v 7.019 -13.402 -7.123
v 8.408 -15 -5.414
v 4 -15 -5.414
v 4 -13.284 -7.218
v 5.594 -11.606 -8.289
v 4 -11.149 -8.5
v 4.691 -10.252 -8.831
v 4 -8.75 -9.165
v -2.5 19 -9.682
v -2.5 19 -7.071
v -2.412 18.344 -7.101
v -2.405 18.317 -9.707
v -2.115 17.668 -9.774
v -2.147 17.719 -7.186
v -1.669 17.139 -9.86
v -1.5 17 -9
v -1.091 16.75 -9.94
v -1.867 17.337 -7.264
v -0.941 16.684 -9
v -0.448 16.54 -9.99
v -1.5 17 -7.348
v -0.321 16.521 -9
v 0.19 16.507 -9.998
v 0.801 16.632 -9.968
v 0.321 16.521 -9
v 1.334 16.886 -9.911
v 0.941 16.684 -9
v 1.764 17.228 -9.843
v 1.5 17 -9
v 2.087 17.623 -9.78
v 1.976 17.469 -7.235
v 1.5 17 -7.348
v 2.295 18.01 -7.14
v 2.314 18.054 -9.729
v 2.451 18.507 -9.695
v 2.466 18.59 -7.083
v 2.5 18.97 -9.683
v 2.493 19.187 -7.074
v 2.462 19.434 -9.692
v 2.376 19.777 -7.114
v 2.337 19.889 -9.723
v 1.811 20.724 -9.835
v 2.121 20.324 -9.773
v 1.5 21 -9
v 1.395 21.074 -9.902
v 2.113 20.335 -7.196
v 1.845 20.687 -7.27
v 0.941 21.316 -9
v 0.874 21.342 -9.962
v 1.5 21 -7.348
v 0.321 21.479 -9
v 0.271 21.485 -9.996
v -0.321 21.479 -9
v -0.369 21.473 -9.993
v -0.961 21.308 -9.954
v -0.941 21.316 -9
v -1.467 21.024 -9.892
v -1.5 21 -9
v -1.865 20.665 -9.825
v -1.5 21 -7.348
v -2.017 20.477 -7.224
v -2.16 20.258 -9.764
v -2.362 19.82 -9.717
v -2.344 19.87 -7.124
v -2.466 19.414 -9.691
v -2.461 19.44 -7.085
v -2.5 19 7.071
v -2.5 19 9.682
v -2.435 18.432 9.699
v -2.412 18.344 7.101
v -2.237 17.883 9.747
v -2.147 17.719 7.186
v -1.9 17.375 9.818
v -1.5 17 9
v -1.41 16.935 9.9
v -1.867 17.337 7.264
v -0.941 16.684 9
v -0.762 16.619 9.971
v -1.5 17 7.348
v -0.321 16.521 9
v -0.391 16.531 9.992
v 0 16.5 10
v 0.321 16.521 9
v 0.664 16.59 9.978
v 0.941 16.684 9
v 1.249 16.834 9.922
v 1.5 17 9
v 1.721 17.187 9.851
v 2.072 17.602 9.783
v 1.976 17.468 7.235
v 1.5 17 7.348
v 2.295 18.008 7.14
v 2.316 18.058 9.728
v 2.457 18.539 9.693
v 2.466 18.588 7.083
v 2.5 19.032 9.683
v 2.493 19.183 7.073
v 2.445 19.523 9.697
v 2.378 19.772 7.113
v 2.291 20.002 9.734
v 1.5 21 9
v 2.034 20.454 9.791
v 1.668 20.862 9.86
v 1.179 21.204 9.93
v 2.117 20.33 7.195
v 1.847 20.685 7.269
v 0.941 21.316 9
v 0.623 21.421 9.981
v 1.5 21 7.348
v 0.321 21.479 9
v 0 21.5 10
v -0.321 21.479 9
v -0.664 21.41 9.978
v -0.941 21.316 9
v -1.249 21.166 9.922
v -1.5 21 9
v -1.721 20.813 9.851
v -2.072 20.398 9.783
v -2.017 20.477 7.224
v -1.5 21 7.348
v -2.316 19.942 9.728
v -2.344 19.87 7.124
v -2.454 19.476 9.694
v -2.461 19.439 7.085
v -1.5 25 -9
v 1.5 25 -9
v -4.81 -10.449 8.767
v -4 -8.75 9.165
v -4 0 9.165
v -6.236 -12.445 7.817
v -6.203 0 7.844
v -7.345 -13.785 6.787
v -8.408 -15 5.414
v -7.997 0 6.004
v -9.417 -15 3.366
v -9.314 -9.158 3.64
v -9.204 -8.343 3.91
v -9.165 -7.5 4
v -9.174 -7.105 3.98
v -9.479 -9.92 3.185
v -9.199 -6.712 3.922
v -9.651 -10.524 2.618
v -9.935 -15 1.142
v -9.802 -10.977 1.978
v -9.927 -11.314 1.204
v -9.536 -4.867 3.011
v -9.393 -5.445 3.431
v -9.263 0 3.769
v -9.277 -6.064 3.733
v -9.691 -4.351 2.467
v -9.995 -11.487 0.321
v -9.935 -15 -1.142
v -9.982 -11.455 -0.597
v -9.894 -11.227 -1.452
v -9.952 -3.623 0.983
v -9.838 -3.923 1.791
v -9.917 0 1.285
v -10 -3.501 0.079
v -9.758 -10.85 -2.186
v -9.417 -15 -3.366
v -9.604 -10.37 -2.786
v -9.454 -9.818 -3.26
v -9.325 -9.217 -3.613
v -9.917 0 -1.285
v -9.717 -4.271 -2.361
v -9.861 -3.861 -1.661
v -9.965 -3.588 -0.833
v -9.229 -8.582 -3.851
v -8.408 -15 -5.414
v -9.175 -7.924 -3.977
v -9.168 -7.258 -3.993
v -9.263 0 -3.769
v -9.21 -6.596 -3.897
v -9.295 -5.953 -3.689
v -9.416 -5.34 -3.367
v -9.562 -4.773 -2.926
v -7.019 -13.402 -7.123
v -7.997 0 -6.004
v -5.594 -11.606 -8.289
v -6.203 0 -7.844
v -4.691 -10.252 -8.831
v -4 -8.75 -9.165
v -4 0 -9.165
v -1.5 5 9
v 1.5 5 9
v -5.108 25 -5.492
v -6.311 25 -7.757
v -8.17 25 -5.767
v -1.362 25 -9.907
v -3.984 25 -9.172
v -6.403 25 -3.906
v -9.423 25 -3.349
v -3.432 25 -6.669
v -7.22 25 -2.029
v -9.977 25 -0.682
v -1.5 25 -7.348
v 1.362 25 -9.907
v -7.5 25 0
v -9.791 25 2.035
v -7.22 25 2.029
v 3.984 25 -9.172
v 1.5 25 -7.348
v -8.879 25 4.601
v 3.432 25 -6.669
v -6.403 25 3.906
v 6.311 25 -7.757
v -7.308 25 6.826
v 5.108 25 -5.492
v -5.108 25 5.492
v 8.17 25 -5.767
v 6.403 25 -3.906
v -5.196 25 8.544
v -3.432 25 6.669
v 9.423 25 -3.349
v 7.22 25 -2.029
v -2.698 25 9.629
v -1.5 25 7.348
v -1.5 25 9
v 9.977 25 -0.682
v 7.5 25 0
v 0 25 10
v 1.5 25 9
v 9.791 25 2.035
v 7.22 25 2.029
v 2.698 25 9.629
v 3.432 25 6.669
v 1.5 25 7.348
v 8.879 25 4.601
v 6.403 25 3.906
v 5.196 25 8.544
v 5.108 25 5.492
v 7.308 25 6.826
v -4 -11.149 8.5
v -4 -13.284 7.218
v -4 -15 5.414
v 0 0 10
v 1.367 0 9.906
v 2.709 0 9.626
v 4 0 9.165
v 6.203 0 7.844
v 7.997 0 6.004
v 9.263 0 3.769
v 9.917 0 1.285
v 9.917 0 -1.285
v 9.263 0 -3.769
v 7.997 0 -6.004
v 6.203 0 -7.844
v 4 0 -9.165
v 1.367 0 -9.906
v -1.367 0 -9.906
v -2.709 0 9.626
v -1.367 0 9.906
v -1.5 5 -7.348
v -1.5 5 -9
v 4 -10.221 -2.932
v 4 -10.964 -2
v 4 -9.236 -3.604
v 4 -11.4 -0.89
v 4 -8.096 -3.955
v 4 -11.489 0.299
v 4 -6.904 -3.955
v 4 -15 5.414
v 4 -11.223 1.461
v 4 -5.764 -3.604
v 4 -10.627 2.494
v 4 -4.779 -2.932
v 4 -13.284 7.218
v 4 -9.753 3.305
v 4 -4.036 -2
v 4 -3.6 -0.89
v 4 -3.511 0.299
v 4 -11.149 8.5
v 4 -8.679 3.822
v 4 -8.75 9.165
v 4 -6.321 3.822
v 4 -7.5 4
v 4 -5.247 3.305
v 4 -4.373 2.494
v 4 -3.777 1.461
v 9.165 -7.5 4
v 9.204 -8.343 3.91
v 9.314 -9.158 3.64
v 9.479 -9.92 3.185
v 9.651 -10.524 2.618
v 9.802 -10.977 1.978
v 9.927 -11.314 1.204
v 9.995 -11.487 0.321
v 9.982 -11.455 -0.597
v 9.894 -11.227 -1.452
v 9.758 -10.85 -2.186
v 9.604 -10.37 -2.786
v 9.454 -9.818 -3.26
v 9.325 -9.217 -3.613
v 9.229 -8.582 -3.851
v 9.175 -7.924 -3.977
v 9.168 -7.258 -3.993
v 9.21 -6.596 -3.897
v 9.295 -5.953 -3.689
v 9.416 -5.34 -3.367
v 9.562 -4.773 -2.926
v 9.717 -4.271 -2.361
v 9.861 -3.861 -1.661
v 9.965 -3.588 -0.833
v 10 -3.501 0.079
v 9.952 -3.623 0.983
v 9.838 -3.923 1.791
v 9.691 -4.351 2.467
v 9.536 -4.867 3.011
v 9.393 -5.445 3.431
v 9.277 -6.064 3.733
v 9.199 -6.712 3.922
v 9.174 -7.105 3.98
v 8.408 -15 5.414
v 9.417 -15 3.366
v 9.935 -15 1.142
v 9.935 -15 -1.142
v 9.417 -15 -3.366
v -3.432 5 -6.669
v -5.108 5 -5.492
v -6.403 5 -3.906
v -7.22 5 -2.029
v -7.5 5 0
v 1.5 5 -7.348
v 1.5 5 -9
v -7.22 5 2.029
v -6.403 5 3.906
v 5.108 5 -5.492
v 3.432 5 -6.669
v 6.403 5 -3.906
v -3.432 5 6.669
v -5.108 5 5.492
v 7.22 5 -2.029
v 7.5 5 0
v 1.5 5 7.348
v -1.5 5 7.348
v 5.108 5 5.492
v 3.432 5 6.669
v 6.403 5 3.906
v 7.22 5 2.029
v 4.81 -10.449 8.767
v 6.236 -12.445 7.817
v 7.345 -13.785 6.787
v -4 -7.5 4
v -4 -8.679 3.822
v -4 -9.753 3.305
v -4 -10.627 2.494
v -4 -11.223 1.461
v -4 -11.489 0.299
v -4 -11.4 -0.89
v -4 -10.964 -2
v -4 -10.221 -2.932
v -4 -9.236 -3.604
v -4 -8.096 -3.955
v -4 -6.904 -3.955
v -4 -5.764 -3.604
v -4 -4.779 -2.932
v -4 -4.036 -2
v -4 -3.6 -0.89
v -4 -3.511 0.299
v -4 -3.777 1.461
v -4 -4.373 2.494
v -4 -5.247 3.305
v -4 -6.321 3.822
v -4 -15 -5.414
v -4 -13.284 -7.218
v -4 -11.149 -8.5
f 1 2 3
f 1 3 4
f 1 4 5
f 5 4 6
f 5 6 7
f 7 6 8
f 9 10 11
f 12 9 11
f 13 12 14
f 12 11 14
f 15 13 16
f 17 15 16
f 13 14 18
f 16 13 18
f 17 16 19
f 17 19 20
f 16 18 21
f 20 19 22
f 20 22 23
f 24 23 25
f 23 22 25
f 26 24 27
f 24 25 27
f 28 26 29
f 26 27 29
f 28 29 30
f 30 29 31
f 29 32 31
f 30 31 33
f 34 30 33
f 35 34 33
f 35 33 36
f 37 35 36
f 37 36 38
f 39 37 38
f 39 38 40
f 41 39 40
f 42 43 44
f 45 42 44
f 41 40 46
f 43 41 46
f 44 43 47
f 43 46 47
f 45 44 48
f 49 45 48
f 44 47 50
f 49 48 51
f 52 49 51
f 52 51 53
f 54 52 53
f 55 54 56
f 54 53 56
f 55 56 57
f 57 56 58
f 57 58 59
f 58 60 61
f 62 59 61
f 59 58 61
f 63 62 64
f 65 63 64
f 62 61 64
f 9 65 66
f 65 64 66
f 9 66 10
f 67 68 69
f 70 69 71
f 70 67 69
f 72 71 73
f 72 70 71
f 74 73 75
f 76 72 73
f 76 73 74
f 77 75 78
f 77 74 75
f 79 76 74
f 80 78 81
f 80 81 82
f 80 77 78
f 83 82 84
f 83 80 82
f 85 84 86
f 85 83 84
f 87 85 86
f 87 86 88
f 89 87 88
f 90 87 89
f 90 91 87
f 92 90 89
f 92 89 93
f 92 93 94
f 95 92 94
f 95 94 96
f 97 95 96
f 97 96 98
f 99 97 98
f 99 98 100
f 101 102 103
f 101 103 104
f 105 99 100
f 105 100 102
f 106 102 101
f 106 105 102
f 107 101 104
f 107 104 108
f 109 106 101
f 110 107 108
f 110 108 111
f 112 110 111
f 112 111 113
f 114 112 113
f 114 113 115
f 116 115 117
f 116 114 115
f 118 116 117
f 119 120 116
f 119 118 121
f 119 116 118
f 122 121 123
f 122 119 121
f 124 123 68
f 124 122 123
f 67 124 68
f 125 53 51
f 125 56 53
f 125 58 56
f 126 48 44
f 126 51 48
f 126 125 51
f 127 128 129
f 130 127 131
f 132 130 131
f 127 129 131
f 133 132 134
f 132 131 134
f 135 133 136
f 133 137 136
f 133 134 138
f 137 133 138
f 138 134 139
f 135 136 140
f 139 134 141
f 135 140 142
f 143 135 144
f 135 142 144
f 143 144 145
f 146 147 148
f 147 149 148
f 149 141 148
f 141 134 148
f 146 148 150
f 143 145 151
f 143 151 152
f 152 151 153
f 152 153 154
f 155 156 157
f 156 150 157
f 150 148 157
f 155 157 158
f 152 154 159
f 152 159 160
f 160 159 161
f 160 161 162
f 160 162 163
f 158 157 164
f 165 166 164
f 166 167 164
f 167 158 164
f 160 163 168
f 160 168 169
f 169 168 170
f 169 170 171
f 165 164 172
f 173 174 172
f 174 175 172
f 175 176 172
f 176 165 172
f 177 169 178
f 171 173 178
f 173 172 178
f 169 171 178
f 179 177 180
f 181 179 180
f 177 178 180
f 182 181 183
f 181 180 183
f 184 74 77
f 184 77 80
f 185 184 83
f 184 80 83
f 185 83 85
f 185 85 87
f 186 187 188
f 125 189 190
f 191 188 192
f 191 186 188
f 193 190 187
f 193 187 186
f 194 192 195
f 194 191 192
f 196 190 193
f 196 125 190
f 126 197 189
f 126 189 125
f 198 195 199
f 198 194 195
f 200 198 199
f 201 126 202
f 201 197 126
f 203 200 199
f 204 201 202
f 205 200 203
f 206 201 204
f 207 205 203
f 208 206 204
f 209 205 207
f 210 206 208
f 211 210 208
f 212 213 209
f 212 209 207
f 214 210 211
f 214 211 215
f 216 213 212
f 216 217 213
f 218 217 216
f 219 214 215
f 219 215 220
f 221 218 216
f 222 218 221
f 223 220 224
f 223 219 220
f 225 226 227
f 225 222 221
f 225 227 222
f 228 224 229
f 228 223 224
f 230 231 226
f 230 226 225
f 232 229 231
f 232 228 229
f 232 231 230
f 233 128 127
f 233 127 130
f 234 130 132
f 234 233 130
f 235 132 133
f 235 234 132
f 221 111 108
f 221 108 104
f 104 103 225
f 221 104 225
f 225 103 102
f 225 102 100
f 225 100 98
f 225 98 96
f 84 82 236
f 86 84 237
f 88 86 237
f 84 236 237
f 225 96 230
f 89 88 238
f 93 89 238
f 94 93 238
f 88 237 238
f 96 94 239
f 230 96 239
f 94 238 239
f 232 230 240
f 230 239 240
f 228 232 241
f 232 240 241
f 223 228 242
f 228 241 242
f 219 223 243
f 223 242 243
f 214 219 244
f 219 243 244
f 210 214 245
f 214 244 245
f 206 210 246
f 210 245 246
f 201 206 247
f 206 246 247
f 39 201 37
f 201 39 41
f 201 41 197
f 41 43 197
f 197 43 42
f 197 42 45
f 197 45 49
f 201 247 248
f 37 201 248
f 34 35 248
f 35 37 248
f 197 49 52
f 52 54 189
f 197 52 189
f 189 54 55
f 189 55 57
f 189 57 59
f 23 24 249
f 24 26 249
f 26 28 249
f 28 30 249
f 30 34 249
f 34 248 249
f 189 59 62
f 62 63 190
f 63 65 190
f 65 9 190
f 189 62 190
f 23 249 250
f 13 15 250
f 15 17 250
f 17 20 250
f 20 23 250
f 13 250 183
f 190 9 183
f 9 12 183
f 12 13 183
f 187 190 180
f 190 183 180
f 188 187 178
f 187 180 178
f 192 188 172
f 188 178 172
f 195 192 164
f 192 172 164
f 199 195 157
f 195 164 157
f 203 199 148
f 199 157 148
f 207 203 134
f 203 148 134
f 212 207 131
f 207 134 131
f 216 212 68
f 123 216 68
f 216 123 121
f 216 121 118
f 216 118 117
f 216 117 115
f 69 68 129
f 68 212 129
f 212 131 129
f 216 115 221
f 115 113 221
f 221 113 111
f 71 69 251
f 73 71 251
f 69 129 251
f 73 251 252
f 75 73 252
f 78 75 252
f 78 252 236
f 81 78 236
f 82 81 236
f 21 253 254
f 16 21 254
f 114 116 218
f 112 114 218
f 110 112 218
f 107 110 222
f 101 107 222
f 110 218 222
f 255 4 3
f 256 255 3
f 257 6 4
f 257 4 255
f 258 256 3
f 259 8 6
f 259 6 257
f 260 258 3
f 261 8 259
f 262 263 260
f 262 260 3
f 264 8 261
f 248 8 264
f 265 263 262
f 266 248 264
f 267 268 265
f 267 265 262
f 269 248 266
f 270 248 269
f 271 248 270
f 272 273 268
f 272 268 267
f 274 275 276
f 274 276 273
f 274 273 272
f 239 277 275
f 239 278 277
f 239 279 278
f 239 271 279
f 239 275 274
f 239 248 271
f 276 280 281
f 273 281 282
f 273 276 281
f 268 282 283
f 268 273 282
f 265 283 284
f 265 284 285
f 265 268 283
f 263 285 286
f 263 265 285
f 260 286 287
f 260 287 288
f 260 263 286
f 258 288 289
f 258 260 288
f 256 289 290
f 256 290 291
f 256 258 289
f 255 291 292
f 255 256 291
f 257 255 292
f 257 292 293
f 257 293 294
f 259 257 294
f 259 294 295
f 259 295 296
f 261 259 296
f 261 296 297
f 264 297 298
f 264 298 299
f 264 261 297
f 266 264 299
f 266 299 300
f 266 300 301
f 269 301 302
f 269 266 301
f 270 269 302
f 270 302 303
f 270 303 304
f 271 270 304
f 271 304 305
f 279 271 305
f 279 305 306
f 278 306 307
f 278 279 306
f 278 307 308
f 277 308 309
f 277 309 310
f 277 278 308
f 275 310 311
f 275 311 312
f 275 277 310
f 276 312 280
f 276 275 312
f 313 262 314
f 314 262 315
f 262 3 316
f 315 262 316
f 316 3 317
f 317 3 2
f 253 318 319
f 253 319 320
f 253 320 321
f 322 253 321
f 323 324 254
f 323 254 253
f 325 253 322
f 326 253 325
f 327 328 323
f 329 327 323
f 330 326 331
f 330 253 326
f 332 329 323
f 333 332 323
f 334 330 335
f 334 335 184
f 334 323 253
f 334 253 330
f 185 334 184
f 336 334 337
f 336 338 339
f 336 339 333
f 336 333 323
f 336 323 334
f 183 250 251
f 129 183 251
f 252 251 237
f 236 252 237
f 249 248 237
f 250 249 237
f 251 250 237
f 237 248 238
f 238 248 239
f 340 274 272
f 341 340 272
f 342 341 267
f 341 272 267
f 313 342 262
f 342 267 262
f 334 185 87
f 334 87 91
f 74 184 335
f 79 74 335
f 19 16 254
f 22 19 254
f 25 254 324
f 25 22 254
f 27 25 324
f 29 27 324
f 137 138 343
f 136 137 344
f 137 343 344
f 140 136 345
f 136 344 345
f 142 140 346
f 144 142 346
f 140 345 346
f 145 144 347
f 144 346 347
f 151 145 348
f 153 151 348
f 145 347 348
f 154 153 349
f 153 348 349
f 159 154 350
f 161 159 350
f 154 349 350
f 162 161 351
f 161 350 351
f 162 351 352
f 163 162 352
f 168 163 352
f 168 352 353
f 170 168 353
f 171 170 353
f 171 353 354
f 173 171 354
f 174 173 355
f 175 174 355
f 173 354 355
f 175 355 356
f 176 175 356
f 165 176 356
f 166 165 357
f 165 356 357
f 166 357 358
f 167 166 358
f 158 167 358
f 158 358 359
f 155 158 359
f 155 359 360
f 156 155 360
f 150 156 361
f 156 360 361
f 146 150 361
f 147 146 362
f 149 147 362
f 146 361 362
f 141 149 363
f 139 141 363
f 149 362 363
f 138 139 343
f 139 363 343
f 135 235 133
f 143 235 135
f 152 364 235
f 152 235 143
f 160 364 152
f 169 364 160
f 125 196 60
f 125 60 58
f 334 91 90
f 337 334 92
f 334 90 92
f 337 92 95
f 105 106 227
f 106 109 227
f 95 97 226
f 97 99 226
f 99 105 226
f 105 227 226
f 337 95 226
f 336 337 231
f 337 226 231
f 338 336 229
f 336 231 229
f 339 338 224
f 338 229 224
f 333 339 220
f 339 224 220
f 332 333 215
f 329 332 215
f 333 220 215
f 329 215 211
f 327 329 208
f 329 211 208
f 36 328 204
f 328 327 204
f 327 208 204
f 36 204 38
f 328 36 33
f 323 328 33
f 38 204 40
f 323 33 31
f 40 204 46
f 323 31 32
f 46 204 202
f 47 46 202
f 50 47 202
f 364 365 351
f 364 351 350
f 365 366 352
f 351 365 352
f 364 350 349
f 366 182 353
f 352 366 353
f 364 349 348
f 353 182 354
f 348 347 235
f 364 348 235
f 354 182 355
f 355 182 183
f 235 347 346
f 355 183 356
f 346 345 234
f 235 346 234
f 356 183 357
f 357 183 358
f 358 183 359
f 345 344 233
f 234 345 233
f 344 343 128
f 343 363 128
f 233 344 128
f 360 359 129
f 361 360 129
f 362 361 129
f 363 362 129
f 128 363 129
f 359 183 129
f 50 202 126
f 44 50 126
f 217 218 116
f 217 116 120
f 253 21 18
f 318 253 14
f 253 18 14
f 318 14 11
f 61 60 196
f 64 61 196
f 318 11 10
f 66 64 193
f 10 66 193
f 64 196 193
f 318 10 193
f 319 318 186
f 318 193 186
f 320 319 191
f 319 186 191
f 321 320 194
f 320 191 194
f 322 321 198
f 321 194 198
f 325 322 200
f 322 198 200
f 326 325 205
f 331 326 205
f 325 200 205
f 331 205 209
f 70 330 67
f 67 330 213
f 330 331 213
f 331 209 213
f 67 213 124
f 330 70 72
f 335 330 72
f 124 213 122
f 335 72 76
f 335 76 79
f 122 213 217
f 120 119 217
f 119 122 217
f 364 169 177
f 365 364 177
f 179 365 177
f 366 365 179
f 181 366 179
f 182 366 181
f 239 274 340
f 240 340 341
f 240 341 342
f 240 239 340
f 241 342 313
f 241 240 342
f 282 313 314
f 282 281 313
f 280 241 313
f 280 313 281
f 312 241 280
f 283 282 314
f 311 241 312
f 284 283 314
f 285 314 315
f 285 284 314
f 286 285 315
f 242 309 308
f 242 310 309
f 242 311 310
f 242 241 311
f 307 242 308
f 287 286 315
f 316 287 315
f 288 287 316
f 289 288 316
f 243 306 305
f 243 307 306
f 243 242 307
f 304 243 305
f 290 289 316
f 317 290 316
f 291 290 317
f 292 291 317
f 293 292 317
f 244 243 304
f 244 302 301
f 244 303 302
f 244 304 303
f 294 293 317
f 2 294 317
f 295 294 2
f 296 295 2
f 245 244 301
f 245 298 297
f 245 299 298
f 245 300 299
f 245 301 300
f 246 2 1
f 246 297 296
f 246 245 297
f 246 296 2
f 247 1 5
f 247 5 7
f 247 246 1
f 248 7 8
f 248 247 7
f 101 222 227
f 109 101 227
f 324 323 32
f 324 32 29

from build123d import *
from build123d.topology import SkipClean

# Parameters (mm, degrees)
SKETCH1_R               = 10
BOSS_EXTRUDE1_DEPTH     = 25
BOSS_EXTRUDE2_START     = -15
BOSS_EXTRUDE2_DEPTH     = 15
CUT_EXTRUDE2_DEPTH      = 20
CUT_EXTRUDE2_DEPTH_BACK = 20
SKETCH4_R               = 4
SKETCH5_R               = 7.5
CUT_EXTRUDE3_DEPTH      = 20
CUT_EXTRUDE4_DEPTH      = 10
CUT_EXTRUDE4_DEPTH_BACK = 10
SKETCH6_R               = 2.5
SKETCH7_W               = 3
SKETCH7_H               = 18
CUT_EXTRUDE5_DEPTH      = 20


with BuildPart() as part:
    # Sketch1 → Boss-Extrude1 (new body)
    with BuildSketch(Plane(origin=(0, 0, 0), x_dir=(1, 0, 0), z_dir=(0, 1, 0))):
        Circle(SKETCH1_R)
    extrude(amount=BOSS_EXTRUDE1_DEPTH)

    # Sketch3 → Boss-Extrude2 (add)
    with SkipClean():  # the faces are left unmerged after this step: merging them gives an invalid solid
        with BuildSketch(Plane(origin=(0, 0, 0), x_dir=(1, 0, 0), z_dir=(0, 1, 0)).offset(BOSS_EXTRUDE2_START)):
            with BuildLine():
                Line((-4, 9.16515139), (-4, -9.16515139))
                ThreePointArc((-4, -9.16515139), (-10, 0), (-4, 9.16515139))
            make_face()
            with BuildLine():
                Line((4, 9.16515139), (4, -9.16515139))
                ThreePointArc((4, -9.16515139), (10, 0), (4, 9.16515139))
            make_face()
        extrude(amount=BOSS_EXTRUDE2_DEPTH)

    # Sketch4 → Cut-Extrude2 (cut, two sides: drawn at the far end of the back side and taken through both)
    with SkipClean():  # the faces are left unmerged after this step: merging them gives an invalid solid
        with BuildSketch(Plane(origin=(0, 0, 0), x_dir=(0, 0, -1), z_dir=(1, 0, 0)).offset(-CUT_EXTRUDE2_DEPTH_BACK)):
            with Locations((0, -7.5)):
                Circle(SKETCH4_R)
            with BuildLine():
                Line((9.25, -7.5), (14.844368797, -7.5))
                Line((14.844368797, -7.5), (14.844368797, -20.157267439))
                Line((14.844368797, -20.157267439), (-15.402777655, -20.157267439))
                Line((-15.402777655, -20.157267439), (-15.402777655, -7.5))
                Line((-15.402777655, -7.5), (-9.25, -7.5))
                ThreePointArc((-9.25, -7.5), (0, -16.75), (9.25, -7.5))
            make_face()
        extrude(amount=CUT_EXTRUDE2_DEPTH + CUT_EXTRUDE2_DEPTH_BACK, mode=Mode.SUBTRACT)

    # Sketch5 → Cut-Extrude3 (cut)
    with SkipClean():  # the faces are left unmerged after this step: merging them gives an invalid solid
        with BuildSketch(Plane(origin=(0, 25, 0), x_dir=(1, 0, 0), z_dir=(0, 1, 0))):
            Circle(SKETCH5_R)
        extrude(amount=-CUT_EXTRUDE3_DEPTH, mode=Mode.SUBTRACT)

    # Sketch6 → Cut-Extrude4 (cut, two sides: drawn at the far end of the back side and taken through both)
    with SkipClean():  # the faces are left unmerged after this step: merging them gives an invalid solid
        with BuildSketch(Plane.XY.offset(-CUT_EXTRUDE4_DEPTH_BACK)):
            with Locations((0, 19)):
                Circle(SKETCH6_R)
        extrude(amount=CUT_EXTRUDE4_DEPTH + CUT_EXTRUDE4_DEPTH_BACK, mode=Mode.SUBTRACT)

    # Sketch7 → Cut-Extrude5 (cut)
    with SkipClean():  # the faces are left unmerged after this step: merging them gives an invalid solid
        with BuildSketch(Plane(origin=(0, 25, 0), x_dir=(1, 0, 0), z_dir=(0, 1, 0))):
            Rectangle(SKETCH7_W, SKETCH7_H)
        extrude(amount=-CUT_EXTRUDE5_DEPTH, mode=Mode.SUBTRACT)


solid = part.part
